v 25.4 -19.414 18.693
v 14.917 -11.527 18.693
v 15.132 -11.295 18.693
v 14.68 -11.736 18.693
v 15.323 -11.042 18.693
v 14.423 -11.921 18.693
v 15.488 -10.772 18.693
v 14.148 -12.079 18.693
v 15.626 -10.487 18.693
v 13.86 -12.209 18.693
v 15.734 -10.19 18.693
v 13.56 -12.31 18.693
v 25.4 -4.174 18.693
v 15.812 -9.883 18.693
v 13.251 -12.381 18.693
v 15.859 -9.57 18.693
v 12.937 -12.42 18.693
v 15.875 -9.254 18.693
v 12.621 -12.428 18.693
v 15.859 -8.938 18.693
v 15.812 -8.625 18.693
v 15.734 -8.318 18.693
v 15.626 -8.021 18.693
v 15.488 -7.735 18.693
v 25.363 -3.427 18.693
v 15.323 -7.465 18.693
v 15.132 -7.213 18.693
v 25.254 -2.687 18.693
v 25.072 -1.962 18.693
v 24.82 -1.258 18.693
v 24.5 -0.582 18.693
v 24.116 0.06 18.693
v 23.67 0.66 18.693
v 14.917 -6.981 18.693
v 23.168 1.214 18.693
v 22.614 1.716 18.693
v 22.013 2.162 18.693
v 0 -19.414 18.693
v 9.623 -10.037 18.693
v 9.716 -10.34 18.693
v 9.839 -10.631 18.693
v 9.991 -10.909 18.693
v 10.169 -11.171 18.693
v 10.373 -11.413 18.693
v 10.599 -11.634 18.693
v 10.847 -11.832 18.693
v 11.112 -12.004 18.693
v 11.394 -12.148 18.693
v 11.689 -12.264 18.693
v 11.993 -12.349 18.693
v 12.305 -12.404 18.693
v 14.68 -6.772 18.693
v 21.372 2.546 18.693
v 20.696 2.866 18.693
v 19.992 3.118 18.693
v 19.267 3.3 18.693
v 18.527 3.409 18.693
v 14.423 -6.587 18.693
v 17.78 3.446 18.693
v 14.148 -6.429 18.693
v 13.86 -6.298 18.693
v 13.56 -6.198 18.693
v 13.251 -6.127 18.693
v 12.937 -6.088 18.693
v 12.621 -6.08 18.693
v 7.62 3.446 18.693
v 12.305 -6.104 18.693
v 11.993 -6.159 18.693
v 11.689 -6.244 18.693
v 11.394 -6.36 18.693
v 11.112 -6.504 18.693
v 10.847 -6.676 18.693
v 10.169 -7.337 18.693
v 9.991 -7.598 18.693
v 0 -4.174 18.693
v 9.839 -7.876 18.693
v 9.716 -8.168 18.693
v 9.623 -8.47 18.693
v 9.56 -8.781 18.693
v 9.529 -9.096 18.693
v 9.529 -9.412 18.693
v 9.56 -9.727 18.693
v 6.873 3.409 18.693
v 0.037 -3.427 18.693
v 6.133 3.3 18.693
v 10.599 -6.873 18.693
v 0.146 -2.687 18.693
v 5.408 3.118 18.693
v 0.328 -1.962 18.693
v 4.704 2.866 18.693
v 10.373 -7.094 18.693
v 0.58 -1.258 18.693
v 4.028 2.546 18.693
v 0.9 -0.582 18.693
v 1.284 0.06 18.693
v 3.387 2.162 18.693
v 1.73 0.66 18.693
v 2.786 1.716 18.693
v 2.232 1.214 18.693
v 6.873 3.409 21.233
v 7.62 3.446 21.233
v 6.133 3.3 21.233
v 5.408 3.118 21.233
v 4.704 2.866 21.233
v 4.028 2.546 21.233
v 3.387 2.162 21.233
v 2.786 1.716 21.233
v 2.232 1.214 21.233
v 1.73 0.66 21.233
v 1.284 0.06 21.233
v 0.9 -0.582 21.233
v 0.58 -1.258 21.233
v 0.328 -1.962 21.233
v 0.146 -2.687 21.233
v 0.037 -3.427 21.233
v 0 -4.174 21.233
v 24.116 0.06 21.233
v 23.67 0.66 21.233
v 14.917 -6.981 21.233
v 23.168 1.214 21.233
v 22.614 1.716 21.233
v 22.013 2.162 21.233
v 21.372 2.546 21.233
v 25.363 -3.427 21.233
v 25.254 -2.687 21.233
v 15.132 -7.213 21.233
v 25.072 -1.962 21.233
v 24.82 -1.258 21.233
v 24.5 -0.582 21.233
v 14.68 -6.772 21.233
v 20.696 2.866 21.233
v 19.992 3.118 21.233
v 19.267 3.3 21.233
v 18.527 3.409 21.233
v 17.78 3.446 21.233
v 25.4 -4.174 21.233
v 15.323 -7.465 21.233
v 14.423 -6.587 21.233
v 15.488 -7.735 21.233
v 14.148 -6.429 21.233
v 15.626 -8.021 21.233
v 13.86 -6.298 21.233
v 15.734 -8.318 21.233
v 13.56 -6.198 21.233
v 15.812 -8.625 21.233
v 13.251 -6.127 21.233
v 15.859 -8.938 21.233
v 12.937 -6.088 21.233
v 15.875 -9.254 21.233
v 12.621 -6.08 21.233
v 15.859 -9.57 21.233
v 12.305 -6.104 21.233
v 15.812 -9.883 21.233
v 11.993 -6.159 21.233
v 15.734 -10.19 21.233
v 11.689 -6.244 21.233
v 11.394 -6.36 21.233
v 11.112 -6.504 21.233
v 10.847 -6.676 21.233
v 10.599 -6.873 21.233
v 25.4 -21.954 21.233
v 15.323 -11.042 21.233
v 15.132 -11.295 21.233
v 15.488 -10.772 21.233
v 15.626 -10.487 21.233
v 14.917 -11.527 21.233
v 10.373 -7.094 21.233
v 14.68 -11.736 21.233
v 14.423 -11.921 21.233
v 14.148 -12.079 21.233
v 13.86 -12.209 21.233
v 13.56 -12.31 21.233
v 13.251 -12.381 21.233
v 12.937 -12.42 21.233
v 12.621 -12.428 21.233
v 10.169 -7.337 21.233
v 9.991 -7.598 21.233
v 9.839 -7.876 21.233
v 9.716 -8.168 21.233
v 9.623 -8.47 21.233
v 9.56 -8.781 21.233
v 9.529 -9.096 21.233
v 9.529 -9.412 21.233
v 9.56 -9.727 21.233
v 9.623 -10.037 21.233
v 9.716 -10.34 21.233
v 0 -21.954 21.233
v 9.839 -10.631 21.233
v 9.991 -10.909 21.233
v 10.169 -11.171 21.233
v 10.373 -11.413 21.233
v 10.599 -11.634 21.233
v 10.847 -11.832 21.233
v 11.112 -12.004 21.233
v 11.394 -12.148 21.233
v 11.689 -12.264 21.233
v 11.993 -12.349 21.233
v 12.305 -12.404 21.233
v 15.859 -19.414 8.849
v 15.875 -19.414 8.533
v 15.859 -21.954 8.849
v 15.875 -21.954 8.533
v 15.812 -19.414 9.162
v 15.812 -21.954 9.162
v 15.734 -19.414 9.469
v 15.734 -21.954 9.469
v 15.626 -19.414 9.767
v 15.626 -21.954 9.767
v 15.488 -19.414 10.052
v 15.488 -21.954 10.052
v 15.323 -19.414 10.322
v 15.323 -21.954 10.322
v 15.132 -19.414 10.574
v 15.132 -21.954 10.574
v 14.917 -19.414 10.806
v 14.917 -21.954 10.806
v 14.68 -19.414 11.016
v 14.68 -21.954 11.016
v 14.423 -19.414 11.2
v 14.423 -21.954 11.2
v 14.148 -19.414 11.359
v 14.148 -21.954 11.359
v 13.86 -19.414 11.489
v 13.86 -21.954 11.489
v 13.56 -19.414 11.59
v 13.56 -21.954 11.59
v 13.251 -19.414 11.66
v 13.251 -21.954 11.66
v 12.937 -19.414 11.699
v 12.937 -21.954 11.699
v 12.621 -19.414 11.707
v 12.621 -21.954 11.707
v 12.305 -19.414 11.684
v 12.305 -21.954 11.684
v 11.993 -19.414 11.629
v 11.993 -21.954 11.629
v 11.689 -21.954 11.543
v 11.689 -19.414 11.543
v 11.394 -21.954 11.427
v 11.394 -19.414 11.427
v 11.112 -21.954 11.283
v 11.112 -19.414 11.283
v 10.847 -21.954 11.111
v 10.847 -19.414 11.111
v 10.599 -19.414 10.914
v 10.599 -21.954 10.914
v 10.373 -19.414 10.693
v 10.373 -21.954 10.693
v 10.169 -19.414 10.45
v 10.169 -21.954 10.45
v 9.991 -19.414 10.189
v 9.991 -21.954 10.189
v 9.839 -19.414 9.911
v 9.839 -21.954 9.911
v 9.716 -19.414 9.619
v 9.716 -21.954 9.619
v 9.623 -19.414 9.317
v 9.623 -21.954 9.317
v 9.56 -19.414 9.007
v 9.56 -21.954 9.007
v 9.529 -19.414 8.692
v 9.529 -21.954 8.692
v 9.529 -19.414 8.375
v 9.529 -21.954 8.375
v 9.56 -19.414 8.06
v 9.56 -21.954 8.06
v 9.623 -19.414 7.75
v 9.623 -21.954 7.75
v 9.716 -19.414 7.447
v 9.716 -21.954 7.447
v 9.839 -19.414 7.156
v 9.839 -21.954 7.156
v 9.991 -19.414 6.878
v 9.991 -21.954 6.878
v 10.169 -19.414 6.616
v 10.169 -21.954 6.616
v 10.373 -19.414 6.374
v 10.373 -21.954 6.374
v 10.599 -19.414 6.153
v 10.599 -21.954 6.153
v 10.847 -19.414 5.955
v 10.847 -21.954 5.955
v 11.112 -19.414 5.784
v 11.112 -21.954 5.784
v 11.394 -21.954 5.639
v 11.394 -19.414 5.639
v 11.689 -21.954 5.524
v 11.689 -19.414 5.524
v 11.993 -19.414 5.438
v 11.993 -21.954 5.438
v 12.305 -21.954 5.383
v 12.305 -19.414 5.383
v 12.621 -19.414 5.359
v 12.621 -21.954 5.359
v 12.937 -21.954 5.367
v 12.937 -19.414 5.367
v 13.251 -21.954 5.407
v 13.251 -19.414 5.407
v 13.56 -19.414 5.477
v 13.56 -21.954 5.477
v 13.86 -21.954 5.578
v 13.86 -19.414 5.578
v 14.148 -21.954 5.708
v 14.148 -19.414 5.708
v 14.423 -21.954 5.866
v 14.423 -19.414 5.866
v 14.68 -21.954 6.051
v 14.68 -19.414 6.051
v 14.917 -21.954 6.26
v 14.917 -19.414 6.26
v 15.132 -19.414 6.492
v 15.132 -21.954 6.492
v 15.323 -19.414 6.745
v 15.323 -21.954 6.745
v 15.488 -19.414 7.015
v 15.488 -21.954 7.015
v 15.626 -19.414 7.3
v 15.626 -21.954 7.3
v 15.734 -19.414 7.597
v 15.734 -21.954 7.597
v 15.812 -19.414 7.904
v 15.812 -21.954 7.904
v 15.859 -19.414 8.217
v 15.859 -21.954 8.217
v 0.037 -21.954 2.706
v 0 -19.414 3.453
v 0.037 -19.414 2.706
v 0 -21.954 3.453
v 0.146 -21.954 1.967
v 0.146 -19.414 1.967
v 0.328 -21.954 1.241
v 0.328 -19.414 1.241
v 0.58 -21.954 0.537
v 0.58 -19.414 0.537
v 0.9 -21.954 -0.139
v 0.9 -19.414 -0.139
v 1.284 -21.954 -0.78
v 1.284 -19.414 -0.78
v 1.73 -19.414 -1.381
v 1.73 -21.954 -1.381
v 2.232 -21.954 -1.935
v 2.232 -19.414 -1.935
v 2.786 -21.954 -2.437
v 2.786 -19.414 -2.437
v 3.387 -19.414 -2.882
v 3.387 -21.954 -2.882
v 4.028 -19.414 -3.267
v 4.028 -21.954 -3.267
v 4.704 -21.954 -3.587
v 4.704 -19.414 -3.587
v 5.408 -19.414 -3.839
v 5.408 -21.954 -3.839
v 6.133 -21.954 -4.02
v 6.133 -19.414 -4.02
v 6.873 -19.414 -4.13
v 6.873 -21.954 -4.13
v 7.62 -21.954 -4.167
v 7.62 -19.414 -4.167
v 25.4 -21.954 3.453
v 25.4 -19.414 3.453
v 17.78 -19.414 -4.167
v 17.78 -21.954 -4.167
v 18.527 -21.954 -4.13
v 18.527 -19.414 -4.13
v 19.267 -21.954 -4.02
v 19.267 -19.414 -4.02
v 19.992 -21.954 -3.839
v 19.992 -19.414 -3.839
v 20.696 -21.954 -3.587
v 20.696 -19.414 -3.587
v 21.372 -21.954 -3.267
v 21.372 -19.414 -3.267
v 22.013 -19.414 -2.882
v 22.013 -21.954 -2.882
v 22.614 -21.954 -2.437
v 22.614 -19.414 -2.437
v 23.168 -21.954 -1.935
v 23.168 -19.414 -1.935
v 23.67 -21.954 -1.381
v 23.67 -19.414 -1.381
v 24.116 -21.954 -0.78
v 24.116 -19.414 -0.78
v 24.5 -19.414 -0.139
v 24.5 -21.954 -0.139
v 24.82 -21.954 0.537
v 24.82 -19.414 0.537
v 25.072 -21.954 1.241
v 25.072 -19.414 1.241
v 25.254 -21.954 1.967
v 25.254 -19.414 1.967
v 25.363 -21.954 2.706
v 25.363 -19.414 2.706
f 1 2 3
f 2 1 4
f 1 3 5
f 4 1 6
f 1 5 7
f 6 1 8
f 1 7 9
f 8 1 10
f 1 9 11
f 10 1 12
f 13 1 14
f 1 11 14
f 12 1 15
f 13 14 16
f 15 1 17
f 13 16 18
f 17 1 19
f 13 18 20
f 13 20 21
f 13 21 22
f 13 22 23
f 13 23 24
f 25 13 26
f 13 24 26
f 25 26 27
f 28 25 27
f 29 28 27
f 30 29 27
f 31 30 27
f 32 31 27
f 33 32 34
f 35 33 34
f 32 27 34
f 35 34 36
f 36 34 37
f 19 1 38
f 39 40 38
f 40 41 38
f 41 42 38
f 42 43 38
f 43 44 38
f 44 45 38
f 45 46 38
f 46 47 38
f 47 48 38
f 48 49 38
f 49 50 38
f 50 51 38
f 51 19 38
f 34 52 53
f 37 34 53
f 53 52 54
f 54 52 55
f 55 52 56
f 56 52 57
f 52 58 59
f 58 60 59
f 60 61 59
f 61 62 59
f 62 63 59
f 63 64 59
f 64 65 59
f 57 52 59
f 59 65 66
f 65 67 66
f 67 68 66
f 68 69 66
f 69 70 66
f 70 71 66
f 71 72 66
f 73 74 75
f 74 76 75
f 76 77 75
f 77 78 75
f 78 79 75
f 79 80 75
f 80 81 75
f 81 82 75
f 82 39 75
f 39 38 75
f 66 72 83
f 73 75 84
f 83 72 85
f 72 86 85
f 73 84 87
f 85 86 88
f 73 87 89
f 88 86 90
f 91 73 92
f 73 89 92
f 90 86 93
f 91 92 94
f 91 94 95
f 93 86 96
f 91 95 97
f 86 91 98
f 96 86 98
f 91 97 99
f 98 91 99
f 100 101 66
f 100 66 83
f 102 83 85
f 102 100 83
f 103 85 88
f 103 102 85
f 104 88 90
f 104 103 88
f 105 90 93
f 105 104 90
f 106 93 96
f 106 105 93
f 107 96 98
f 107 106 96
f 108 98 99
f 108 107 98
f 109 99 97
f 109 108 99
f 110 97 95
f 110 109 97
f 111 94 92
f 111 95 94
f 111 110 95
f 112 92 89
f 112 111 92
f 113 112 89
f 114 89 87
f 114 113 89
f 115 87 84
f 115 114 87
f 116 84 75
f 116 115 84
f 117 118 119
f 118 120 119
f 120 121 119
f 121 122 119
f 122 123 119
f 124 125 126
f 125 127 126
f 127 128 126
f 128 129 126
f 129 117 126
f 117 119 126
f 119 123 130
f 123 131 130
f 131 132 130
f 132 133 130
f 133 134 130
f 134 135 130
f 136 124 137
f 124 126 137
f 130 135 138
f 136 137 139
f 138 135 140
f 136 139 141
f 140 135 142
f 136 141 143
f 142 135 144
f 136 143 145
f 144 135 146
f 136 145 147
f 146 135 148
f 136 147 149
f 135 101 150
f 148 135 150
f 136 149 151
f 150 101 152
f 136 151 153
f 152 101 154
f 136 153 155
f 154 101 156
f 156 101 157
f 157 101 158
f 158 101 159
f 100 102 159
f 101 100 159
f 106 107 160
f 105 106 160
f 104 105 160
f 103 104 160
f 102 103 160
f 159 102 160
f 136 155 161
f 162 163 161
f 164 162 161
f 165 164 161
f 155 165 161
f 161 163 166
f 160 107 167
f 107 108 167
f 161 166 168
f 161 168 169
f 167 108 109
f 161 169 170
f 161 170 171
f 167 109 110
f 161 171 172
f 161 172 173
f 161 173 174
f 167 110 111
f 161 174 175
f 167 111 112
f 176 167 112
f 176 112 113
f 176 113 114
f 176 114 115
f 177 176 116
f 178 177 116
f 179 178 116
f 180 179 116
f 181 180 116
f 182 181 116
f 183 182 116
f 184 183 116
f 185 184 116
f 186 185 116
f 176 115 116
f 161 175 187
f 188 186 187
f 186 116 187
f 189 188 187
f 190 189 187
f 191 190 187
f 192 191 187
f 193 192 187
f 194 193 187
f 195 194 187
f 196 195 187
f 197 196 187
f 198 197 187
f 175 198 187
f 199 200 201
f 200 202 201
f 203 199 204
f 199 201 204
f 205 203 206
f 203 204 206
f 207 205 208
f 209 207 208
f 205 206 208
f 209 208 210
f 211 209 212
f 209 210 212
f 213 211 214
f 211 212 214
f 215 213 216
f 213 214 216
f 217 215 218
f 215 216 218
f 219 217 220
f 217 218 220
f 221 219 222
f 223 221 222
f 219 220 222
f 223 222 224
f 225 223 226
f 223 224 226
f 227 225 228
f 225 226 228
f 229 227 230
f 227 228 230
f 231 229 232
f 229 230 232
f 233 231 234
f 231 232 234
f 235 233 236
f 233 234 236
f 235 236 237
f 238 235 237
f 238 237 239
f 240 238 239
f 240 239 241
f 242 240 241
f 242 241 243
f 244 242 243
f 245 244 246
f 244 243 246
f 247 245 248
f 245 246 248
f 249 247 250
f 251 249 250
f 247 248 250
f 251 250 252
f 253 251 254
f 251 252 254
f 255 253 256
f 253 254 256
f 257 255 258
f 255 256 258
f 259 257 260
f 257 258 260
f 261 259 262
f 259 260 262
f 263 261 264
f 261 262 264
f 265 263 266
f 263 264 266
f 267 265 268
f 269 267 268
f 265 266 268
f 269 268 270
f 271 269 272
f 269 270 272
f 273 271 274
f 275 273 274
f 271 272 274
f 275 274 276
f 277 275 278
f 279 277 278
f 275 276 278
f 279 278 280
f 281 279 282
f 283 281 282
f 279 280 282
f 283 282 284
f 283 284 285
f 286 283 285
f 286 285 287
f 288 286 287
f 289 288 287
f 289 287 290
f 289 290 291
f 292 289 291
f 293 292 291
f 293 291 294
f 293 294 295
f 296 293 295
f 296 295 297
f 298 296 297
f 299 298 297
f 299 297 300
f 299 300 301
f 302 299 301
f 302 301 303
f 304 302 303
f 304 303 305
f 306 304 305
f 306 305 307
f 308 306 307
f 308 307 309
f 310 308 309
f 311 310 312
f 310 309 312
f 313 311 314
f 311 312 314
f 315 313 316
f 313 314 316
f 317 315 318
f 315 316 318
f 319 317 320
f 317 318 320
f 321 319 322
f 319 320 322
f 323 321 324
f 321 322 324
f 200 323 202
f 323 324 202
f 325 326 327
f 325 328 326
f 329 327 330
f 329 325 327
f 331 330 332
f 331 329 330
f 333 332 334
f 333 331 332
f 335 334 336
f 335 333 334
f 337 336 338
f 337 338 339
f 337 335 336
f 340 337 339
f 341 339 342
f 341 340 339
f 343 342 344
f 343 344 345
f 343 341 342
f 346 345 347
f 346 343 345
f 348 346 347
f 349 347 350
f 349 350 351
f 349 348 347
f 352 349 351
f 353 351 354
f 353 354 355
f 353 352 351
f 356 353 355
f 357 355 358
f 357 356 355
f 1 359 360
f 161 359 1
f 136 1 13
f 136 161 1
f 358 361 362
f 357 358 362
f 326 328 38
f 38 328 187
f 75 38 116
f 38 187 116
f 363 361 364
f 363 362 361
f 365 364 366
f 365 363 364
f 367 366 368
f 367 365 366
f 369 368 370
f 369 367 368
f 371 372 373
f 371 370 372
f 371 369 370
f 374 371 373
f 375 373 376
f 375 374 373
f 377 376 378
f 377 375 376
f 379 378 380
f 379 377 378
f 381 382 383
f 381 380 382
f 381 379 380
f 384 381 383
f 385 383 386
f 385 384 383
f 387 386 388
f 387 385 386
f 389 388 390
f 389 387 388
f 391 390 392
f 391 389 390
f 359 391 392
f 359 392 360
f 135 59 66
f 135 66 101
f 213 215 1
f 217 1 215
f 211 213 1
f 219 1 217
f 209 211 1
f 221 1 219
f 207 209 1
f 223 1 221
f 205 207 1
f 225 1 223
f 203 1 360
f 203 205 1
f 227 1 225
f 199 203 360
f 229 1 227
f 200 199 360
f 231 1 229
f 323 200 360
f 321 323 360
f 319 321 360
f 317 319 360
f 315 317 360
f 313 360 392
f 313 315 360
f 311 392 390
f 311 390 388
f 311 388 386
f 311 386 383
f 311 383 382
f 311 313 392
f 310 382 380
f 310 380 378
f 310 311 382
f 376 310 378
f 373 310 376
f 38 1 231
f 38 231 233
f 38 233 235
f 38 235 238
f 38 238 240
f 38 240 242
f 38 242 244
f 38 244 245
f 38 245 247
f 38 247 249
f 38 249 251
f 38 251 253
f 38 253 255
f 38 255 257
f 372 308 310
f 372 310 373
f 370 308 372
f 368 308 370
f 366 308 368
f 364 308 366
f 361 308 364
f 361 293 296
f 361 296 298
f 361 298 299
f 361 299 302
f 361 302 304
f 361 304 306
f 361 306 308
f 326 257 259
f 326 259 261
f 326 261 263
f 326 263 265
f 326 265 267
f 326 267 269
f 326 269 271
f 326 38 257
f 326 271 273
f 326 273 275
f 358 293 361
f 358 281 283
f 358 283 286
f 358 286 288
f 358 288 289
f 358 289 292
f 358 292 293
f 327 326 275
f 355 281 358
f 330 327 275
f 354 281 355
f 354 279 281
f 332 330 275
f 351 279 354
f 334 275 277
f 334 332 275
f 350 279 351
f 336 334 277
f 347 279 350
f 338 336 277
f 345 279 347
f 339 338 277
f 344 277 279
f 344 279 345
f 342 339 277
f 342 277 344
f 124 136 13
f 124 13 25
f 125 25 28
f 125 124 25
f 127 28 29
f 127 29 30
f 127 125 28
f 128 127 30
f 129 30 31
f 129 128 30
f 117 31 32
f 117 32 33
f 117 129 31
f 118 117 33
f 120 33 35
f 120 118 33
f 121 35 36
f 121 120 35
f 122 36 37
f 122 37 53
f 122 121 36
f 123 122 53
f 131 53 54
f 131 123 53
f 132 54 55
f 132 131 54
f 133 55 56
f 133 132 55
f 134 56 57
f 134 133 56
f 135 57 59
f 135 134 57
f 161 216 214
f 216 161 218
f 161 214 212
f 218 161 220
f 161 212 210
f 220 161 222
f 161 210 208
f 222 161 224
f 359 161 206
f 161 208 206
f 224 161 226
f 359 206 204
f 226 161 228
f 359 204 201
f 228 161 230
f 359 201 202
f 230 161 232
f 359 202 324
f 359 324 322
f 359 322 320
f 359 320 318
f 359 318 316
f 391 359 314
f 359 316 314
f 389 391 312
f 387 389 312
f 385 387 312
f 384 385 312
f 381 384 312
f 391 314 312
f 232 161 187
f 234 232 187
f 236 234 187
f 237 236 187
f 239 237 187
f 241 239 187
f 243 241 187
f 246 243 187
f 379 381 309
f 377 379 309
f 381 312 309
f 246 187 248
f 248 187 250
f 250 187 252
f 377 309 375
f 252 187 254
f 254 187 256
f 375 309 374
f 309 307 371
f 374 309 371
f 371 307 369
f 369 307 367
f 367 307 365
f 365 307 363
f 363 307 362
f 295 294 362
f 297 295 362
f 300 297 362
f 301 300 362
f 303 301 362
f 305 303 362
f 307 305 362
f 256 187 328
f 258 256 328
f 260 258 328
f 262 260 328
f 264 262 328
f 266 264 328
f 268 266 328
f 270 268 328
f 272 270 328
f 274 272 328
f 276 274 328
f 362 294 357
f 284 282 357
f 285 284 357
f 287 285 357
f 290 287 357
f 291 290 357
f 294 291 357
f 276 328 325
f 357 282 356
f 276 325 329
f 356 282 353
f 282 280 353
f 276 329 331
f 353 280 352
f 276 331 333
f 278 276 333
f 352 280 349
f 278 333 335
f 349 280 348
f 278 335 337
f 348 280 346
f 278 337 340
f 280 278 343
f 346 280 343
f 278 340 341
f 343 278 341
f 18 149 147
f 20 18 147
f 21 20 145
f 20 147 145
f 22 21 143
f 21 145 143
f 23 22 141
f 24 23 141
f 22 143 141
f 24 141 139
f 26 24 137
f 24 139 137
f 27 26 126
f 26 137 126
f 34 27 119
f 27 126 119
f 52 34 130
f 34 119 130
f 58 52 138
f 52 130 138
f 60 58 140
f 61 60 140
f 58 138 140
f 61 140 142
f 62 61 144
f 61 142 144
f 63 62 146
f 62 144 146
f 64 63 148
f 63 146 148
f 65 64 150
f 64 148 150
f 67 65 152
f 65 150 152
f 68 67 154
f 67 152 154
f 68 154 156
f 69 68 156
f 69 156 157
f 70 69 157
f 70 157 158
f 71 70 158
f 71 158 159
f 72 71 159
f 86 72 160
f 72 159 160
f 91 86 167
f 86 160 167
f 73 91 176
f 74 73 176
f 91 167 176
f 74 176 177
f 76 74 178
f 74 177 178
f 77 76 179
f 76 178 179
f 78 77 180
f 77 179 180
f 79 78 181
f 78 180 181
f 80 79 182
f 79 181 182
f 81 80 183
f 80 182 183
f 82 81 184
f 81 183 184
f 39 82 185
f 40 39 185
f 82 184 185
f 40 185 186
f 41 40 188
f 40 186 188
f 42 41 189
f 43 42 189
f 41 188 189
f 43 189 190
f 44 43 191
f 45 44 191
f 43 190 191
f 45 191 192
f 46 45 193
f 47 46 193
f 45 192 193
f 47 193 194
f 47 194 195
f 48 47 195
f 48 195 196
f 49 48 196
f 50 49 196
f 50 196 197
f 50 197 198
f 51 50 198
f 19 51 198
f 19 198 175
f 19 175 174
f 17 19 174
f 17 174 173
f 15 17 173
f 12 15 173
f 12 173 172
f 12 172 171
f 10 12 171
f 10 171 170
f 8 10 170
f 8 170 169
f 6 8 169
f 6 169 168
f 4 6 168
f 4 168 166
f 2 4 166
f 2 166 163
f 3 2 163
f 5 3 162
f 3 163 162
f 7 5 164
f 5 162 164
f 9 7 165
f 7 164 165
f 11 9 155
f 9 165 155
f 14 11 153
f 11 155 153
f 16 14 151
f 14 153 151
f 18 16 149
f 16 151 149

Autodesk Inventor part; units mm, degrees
ref_plane "YZ Plane" through (0, 0, 0) normal (1, 0, 0) x (0, 1, 0)
ref_plane "XZ Plane" through (0, 0, 0) normal (0, 1, 0) x (-1, 0, 0)
ref_plane "XY Plane" through (0, 0, 0) normal (0, 0, 1) x (1, 0, 0)
sketch "Sketch1" plane through (0, 0, 0) normal (1, 0, 0) x (0, 1, 0)
  line L0 (-21.9539, 18.6933) -> (3.4461, 18.6933)
  line L1 (3.4461, 18.6933) -> (3.4461, 21.2333)
  line L2 (3.4461, 21.2333) -> (-21.9539, 21.2333)
  line L3 (-21.9539, 21.2333) -> (-21.9539, 18.6933)
  line L4 (-21.9539, 18.6933) -> (-19.4139, 18.6933)
  line L5 (-19.4139, 18.6933) -> (-19.4139, -4.1667)
  line L6 (-19.4139, -4.1667) -> (-21.9539, -4.1667)
  line L7 (-21.9539, -4.1667) -> (-21.9539, 18.6933)
  point P0 (0, 0)
  dimension "d0" = 2.54
  dimension "d1" = 2.54
  dimension "d2" = 25.4
  dimension "d3" = 25.4
extrude "Extrusion1" add sketch "Sketch1" along normal blind 25.4
sketch "Sketch2" plane through (0, -21.9539, 21.2333) normal (0, 0, 1) x (1, 0, 0)
  circle A0 centre (12.7, 12.7) radius 3.175
  line L0 (0, 25.4) -> (25.4, 25.4) projected
  line L1 (25.4, 25.4) -> (25.4, 0) projected
  point P0 (0, 21.9539)
  dimension "d6" = 6.35
  dimension "d7" = 12.7
  dimension "d8" = 12.7
extrude "Extrusion2" cut sketch "Sketch2" against normal blind 25.4
sketch "Sketch3" plane through (0, -21.9539, -4.1667) normal (0, -1, 0) x (1, 0, 0)
  circle A0 centre (12.7, 12.7) radius 3.175
  line L0 (0, 25.4) -> (25.4, 25.4) projected
  line L1 (25.4, 25.4) -> (25.4, 0) projected
  point P0 (0, 4.1667)
  dimension "d11" = 12.7
  dimension "d12" = 12.7
  dimension "d13" = 6.35
extrude "Extrusion3" cut sketch "Sketch3" against normal blind 25.4
fillet "Fillet1" radius 7.62 4 edges at (25.4, 3.4461, 19.9633) (0, 3.4461, 19.9633) (25.4, -20.6839, -4.1667) (0, -20.6839, -4.1667)
properties part number "80-20 bracket 1in"
